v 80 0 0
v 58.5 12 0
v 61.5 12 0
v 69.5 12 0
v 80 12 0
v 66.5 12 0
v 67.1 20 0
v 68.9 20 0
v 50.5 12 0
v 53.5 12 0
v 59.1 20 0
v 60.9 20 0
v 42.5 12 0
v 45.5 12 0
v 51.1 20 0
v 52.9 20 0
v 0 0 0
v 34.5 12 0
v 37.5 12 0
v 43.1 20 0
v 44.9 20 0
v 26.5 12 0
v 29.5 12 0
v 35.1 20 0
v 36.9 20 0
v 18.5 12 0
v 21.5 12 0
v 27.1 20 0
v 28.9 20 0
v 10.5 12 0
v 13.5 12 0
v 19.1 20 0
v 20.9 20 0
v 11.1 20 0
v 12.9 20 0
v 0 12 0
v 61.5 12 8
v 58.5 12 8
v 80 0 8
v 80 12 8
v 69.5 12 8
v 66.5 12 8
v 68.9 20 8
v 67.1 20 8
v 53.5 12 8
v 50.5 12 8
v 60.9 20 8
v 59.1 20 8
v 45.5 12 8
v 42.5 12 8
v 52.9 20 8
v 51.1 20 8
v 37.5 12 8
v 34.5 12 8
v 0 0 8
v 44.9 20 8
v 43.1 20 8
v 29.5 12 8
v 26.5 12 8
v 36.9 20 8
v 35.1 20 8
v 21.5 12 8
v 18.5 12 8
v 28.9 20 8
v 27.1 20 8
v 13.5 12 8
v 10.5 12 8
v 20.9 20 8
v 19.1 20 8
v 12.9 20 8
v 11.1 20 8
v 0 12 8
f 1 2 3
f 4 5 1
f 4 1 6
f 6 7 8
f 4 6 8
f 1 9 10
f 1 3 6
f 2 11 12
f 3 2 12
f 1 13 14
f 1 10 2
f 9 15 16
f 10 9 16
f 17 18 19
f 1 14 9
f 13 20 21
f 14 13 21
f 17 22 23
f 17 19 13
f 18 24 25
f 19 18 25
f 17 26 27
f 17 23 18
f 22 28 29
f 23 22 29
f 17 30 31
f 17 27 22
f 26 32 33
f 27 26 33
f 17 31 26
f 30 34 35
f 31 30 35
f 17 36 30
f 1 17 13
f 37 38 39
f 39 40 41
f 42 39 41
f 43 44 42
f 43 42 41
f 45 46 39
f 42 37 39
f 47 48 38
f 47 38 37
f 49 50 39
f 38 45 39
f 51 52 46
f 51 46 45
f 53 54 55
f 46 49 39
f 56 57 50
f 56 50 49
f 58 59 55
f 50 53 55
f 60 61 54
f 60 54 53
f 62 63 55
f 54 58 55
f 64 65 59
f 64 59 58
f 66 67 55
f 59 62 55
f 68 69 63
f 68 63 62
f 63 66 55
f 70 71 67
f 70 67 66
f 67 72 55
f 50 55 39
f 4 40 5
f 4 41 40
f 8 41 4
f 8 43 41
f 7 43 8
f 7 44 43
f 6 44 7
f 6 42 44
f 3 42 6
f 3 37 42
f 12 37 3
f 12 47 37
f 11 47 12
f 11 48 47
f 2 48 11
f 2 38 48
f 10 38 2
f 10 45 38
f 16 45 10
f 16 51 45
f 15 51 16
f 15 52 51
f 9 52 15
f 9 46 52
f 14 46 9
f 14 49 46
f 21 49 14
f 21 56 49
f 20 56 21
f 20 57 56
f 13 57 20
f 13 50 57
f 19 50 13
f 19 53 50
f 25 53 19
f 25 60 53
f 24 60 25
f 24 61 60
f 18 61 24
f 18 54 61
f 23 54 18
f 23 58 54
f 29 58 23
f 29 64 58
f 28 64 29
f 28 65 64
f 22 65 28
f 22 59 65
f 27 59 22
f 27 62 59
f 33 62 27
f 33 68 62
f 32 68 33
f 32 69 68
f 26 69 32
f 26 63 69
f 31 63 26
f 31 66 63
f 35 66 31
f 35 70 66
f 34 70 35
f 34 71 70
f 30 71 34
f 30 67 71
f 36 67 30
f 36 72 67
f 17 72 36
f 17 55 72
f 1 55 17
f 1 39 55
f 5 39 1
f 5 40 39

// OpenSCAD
$fn = 32;

// ----------------------------------------------------------------------
// Gear rack: 8 teeth on a 80 mm bar, pitch 8 mm
// ----------------------------------------------------------------------

// --- parameters (mm) ---
profile_height = 8;       // extrusion height
profile_points = 36;      // points of the closed outline

profile = [[0, 0], [80, 0], [80, 12], [69.5, 12], [68.9, 20], [67.1, 20], [66.5, 12], [61.5, 12], [60.9, 20], [59.1, 20], [58.5, 12], [53.5, 12], [52.9, 20], [51.1, 20], [50.5, 12], [45.5, 12], [44.9, 20], [43.1, 20], [42.5, 12], [37.5, 12], [36.9, 20], [35.1, 20], [34.5, 12], [29.5, 12], [28.9, 20], [27.1, 20], [26.5, 12], [21.5, 12], [20.9, 20], [19.1, 20], [18.5, 12], [13.5, 12], [12.9, 20], [11.1, 20], [10.5, 12], [0, 12]];  // single closed polygon, 36 points, counter clockwise

// --- the one profile operation ---
linear_extrude(height = profile_height) polygon(points = profile);
